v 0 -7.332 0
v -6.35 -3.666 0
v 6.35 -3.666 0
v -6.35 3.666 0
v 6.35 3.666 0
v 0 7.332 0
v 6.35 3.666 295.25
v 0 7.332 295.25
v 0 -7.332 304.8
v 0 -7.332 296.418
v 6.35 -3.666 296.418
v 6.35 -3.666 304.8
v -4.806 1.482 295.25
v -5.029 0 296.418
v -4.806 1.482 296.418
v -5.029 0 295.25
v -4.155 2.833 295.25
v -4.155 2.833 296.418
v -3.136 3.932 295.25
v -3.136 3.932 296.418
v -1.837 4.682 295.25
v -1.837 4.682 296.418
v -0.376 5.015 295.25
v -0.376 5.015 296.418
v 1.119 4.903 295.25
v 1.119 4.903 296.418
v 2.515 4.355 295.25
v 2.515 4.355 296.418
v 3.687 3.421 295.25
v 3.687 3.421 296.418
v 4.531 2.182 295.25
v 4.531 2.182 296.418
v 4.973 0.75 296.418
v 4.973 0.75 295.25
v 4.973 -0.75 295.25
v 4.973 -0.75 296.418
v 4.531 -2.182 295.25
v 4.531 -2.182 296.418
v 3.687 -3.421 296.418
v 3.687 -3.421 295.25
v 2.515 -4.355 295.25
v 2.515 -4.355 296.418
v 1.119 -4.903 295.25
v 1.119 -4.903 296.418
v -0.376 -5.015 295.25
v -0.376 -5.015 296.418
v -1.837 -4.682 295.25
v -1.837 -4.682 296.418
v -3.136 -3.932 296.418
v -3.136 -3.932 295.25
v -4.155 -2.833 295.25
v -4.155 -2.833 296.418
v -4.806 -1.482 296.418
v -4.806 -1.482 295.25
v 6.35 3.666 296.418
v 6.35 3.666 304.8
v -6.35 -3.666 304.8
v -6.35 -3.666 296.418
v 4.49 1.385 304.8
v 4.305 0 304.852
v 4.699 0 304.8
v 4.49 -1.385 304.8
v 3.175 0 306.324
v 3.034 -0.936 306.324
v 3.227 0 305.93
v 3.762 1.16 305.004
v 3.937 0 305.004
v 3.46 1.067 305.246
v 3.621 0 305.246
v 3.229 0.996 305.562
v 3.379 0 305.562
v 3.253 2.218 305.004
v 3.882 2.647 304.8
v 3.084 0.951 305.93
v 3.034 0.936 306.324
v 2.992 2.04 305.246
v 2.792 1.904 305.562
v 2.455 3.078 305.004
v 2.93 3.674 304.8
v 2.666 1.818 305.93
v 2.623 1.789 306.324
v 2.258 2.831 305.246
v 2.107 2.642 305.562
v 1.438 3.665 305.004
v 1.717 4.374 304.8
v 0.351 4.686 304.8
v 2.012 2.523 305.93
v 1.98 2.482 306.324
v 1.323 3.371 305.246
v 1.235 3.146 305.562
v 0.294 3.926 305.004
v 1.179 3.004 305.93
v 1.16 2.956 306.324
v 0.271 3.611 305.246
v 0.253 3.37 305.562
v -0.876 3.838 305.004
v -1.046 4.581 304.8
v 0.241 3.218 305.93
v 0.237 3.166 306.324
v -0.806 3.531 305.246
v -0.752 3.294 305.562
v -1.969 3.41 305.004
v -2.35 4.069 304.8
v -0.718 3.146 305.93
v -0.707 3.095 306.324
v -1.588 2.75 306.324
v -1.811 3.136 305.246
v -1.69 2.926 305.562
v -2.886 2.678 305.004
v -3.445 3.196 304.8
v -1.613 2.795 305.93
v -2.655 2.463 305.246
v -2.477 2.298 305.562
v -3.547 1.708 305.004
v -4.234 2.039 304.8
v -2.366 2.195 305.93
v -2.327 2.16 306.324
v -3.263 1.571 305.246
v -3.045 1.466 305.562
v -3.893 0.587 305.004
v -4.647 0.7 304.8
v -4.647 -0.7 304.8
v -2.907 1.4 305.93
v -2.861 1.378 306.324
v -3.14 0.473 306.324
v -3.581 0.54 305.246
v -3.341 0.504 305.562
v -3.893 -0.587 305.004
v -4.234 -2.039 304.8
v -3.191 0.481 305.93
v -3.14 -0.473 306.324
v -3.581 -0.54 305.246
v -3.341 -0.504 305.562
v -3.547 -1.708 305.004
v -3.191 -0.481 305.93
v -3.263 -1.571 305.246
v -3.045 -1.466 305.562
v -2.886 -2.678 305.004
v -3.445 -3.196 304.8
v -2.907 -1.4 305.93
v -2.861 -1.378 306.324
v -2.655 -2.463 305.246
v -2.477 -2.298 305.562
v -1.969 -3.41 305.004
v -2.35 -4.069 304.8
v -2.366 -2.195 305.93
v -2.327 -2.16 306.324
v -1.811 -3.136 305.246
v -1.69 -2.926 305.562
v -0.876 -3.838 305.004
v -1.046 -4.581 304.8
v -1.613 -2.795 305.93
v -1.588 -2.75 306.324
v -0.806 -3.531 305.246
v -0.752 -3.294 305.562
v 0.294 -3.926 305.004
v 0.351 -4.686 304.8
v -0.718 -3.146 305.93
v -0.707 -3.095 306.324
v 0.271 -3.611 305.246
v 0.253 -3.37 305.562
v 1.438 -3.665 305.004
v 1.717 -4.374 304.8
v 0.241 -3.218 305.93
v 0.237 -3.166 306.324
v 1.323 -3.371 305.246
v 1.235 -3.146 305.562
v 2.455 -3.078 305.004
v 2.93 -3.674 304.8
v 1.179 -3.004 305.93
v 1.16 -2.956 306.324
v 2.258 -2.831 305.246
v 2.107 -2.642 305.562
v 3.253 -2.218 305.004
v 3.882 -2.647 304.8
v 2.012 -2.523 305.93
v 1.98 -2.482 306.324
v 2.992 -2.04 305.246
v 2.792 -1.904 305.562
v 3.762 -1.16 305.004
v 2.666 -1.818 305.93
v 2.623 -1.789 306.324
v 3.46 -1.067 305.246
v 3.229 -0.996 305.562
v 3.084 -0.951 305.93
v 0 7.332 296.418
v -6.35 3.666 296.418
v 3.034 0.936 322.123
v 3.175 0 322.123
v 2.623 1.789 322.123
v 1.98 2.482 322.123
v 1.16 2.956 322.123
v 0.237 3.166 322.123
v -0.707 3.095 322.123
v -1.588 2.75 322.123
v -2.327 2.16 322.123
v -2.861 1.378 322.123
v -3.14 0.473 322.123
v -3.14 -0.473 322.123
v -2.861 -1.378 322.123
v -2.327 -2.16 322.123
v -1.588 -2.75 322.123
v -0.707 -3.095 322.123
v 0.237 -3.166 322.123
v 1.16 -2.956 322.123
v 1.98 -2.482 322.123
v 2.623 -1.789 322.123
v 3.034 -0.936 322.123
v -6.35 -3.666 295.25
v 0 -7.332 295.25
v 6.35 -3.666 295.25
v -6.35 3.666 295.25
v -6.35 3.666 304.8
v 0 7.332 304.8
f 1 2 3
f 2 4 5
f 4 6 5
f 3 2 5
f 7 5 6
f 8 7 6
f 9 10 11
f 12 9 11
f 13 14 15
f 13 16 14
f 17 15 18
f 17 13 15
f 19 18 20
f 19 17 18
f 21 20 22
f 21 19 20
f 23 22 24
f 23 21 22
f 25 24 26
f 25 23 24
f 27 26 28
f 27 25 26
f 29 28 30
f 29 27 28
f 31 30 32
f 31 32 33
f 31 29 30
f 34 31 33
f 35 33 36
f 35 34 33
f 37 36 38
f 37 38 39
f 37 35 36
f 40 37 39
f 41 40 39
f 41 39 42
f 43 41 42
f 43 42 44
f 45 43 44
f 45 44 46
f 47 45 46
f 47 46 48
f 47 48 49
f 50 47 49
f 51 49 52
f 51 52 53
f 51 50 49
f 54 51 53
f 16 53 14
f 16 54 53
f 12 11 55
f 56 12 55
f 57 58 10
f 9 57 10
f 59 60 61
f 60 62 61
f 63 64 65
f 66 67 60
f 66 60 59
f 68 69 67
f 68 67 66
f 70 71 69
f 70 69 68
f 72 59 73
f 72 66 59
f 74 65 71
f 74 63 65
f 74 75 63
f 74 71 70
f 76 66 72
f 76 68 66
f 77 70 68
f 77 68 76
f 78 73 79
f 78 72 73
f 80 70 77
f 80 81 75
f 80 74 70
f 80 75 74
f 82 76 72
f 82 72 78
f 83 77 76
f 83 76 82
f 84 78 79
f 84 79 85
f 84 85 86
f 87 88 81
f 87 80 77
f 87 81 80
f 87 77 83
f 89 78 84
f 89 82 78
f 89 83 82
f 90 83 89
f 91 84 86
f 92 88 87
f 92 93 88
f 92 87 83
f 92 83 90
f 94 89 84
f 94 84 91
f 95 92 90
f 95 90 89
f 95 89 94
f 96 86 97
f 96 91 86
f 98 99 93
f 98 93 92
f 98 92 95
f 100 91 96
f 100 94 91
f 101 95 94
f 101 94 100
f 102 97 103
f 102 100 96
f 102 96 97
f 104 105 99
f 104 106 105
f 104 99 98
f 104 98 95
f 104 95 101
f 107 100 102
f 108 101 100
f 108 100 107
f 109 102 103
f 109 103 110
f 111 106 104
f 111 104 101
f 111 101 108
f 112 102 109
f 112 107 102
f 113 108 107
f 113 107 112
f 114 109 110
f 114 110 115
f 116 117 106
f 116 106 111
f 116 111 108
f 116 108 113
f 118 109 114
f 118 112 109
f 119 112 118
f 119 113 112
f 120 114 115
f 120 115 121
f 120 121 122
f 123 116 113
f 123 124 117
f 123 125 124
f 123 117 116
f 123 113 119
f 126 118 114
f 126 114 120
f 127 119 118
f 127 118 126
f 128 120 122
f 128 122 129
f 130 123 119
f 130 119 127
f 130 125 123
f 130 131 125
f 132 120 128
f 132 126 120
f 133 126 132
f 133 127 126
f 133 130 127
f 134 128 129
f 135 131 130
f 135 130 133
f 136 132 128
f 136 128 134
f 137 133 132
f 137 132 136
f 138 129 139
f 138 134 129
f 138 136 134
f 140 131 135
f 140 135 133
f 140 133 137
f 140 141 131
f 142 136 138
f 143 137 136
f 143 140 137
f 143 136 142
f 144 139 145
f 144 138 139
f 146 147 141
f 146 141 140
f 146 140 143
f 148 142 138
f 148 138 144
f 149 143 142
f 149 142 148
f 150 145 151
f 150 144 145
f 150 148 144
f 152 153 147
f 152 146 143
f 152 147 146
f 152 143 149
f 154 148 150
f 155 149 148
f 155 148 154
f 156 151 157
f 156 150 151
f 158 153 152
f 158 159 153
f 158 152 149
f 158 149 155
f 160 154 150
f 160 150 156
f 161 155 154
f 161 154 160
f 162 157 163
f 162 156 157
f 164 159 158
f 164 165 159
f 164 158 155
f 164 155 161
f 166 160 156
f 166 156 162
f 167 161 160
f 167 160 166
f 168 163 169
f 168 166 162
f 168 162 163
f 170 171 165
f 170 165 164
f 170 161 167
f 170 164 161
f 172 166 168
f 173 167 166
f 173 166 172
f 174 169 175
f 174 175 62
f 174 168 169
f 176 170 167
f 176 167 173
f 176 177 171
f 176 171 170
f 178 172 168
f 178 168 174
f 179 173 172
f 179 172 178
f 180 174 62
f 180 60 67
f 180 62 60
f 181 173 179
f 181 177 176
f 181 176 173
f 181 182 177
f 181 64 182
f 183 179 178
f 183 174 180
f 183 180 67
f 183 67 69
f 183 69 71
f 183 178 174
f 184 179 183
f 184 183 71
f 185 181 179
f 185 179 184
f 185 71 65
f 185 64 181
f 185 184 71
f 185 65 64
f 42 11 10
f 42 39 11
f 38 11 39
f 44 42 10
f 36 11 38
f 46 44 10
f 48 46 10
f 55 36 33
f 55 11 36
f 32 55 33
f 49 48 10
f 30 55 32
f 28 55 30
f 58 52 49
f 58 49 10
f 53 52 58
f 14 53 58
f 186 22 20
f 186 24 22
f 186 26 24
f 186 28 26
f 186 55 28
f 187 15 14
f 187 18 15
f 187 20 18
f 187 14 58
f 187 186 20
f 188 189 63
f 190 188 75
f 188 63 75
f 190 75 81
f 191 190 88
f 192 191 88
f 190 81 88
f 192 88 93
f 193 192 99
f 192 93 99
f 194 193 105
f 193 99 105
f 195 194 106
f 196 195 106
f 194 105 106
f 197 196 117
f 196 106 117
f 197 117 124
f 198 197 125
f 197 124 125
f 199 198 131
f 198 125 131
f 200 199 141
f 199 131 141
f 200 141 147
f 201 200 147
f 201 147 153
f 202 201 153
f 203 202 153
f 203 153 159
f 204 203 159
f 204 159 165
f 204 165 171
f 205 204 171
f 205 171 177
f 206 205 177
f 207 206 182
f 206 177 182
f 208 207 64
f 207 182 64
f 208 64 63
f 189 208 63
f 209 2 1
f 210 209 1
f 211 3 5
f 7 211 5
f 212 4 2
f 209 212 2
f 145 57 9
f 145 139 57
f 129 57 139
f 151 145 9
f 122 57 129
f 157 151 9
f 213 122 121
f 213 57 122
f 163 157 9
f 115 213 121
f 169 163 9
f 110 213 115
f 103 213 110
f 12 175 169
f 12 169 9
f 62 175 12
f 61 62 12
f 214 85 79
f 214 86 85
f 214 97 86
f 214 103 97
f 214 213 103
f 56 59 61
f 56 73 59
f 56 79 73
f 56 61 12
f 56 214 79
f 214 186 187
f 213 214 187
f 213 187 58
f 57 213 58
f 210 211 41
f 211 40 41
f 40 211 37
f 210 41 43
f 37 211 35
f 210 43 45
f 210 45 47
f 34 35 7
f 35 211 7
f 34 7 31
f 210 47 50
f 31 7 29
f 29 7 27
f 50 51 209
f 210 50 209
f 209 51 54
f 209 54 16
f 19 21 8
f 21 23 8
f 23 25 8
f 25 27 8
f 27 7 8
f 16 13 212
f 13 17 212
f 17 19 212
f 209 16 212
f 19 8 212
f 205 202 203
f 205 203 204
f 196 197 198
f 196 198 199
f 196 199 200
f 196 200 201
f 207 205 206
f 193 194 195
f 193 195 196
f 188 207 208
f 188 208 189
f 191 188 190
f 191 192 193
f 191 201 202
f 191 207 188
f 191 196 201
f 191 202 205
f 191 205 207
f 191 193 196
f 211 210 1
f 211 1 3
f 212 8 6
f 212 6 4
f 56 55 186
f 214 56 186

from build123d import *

# Parameters (mm, degrees)
BOSS_EXTRUDE1_DEPTH = 304.8
SKETCH2_R           = 3.175
BOSS_EXTRUDE2_DEPTH = 17.3228
FILLET1_R           = 1.524
SKETCH3_W           = 6.35
SKETCH3_H           = 1.1684


with BuildPart() as part:
    # Sketch1 → Boss-Extrude1 (new body)
    with BuildSketch(Plane.XY):
        Polygon((-6.35, 3.666174209), (-6.35, -3.666174209), (0, -7.332348419), (6.35, -3.666174209), (6.35, 3.666174209), (0, 7.332348419), align=None)
    extrude(amount=BOSS_EXTRUDE1_DEPTH)

    # Sketch2 → Boss-Extrude2 (add)
    with BuildSketch(Plane.XY.offset(304.8)):
        Circle(SKETCH2_R)
    extrude(amount=BOSS_EXTRUDE2_DEPTH)

    # Fillet1
    fillet1_edges = [part.edges().sort_by_distance(p)[0] for p in [
        (-3.175, 0, 304.8),
    ]]
    fillet(fillet1_edges, radius=FILLET1_R)

    # Sketch3 → Cut-Revolve1 (revolve, cut)
    with BuildSketch(Plane(origin=(0, 0, 0), x_dir=(1, 0, 0), z_dir=(0, 1, 0))):
        with Locations((-8.2042, -295.8338)):
            Rectangle(SKETCH3_W, SKETCH3_H)
    revolve(axis=Axis((0, 0, 330.02530499), (0, 0, -1)), mode=Mode.SUBTRACT)


solid = part.part
